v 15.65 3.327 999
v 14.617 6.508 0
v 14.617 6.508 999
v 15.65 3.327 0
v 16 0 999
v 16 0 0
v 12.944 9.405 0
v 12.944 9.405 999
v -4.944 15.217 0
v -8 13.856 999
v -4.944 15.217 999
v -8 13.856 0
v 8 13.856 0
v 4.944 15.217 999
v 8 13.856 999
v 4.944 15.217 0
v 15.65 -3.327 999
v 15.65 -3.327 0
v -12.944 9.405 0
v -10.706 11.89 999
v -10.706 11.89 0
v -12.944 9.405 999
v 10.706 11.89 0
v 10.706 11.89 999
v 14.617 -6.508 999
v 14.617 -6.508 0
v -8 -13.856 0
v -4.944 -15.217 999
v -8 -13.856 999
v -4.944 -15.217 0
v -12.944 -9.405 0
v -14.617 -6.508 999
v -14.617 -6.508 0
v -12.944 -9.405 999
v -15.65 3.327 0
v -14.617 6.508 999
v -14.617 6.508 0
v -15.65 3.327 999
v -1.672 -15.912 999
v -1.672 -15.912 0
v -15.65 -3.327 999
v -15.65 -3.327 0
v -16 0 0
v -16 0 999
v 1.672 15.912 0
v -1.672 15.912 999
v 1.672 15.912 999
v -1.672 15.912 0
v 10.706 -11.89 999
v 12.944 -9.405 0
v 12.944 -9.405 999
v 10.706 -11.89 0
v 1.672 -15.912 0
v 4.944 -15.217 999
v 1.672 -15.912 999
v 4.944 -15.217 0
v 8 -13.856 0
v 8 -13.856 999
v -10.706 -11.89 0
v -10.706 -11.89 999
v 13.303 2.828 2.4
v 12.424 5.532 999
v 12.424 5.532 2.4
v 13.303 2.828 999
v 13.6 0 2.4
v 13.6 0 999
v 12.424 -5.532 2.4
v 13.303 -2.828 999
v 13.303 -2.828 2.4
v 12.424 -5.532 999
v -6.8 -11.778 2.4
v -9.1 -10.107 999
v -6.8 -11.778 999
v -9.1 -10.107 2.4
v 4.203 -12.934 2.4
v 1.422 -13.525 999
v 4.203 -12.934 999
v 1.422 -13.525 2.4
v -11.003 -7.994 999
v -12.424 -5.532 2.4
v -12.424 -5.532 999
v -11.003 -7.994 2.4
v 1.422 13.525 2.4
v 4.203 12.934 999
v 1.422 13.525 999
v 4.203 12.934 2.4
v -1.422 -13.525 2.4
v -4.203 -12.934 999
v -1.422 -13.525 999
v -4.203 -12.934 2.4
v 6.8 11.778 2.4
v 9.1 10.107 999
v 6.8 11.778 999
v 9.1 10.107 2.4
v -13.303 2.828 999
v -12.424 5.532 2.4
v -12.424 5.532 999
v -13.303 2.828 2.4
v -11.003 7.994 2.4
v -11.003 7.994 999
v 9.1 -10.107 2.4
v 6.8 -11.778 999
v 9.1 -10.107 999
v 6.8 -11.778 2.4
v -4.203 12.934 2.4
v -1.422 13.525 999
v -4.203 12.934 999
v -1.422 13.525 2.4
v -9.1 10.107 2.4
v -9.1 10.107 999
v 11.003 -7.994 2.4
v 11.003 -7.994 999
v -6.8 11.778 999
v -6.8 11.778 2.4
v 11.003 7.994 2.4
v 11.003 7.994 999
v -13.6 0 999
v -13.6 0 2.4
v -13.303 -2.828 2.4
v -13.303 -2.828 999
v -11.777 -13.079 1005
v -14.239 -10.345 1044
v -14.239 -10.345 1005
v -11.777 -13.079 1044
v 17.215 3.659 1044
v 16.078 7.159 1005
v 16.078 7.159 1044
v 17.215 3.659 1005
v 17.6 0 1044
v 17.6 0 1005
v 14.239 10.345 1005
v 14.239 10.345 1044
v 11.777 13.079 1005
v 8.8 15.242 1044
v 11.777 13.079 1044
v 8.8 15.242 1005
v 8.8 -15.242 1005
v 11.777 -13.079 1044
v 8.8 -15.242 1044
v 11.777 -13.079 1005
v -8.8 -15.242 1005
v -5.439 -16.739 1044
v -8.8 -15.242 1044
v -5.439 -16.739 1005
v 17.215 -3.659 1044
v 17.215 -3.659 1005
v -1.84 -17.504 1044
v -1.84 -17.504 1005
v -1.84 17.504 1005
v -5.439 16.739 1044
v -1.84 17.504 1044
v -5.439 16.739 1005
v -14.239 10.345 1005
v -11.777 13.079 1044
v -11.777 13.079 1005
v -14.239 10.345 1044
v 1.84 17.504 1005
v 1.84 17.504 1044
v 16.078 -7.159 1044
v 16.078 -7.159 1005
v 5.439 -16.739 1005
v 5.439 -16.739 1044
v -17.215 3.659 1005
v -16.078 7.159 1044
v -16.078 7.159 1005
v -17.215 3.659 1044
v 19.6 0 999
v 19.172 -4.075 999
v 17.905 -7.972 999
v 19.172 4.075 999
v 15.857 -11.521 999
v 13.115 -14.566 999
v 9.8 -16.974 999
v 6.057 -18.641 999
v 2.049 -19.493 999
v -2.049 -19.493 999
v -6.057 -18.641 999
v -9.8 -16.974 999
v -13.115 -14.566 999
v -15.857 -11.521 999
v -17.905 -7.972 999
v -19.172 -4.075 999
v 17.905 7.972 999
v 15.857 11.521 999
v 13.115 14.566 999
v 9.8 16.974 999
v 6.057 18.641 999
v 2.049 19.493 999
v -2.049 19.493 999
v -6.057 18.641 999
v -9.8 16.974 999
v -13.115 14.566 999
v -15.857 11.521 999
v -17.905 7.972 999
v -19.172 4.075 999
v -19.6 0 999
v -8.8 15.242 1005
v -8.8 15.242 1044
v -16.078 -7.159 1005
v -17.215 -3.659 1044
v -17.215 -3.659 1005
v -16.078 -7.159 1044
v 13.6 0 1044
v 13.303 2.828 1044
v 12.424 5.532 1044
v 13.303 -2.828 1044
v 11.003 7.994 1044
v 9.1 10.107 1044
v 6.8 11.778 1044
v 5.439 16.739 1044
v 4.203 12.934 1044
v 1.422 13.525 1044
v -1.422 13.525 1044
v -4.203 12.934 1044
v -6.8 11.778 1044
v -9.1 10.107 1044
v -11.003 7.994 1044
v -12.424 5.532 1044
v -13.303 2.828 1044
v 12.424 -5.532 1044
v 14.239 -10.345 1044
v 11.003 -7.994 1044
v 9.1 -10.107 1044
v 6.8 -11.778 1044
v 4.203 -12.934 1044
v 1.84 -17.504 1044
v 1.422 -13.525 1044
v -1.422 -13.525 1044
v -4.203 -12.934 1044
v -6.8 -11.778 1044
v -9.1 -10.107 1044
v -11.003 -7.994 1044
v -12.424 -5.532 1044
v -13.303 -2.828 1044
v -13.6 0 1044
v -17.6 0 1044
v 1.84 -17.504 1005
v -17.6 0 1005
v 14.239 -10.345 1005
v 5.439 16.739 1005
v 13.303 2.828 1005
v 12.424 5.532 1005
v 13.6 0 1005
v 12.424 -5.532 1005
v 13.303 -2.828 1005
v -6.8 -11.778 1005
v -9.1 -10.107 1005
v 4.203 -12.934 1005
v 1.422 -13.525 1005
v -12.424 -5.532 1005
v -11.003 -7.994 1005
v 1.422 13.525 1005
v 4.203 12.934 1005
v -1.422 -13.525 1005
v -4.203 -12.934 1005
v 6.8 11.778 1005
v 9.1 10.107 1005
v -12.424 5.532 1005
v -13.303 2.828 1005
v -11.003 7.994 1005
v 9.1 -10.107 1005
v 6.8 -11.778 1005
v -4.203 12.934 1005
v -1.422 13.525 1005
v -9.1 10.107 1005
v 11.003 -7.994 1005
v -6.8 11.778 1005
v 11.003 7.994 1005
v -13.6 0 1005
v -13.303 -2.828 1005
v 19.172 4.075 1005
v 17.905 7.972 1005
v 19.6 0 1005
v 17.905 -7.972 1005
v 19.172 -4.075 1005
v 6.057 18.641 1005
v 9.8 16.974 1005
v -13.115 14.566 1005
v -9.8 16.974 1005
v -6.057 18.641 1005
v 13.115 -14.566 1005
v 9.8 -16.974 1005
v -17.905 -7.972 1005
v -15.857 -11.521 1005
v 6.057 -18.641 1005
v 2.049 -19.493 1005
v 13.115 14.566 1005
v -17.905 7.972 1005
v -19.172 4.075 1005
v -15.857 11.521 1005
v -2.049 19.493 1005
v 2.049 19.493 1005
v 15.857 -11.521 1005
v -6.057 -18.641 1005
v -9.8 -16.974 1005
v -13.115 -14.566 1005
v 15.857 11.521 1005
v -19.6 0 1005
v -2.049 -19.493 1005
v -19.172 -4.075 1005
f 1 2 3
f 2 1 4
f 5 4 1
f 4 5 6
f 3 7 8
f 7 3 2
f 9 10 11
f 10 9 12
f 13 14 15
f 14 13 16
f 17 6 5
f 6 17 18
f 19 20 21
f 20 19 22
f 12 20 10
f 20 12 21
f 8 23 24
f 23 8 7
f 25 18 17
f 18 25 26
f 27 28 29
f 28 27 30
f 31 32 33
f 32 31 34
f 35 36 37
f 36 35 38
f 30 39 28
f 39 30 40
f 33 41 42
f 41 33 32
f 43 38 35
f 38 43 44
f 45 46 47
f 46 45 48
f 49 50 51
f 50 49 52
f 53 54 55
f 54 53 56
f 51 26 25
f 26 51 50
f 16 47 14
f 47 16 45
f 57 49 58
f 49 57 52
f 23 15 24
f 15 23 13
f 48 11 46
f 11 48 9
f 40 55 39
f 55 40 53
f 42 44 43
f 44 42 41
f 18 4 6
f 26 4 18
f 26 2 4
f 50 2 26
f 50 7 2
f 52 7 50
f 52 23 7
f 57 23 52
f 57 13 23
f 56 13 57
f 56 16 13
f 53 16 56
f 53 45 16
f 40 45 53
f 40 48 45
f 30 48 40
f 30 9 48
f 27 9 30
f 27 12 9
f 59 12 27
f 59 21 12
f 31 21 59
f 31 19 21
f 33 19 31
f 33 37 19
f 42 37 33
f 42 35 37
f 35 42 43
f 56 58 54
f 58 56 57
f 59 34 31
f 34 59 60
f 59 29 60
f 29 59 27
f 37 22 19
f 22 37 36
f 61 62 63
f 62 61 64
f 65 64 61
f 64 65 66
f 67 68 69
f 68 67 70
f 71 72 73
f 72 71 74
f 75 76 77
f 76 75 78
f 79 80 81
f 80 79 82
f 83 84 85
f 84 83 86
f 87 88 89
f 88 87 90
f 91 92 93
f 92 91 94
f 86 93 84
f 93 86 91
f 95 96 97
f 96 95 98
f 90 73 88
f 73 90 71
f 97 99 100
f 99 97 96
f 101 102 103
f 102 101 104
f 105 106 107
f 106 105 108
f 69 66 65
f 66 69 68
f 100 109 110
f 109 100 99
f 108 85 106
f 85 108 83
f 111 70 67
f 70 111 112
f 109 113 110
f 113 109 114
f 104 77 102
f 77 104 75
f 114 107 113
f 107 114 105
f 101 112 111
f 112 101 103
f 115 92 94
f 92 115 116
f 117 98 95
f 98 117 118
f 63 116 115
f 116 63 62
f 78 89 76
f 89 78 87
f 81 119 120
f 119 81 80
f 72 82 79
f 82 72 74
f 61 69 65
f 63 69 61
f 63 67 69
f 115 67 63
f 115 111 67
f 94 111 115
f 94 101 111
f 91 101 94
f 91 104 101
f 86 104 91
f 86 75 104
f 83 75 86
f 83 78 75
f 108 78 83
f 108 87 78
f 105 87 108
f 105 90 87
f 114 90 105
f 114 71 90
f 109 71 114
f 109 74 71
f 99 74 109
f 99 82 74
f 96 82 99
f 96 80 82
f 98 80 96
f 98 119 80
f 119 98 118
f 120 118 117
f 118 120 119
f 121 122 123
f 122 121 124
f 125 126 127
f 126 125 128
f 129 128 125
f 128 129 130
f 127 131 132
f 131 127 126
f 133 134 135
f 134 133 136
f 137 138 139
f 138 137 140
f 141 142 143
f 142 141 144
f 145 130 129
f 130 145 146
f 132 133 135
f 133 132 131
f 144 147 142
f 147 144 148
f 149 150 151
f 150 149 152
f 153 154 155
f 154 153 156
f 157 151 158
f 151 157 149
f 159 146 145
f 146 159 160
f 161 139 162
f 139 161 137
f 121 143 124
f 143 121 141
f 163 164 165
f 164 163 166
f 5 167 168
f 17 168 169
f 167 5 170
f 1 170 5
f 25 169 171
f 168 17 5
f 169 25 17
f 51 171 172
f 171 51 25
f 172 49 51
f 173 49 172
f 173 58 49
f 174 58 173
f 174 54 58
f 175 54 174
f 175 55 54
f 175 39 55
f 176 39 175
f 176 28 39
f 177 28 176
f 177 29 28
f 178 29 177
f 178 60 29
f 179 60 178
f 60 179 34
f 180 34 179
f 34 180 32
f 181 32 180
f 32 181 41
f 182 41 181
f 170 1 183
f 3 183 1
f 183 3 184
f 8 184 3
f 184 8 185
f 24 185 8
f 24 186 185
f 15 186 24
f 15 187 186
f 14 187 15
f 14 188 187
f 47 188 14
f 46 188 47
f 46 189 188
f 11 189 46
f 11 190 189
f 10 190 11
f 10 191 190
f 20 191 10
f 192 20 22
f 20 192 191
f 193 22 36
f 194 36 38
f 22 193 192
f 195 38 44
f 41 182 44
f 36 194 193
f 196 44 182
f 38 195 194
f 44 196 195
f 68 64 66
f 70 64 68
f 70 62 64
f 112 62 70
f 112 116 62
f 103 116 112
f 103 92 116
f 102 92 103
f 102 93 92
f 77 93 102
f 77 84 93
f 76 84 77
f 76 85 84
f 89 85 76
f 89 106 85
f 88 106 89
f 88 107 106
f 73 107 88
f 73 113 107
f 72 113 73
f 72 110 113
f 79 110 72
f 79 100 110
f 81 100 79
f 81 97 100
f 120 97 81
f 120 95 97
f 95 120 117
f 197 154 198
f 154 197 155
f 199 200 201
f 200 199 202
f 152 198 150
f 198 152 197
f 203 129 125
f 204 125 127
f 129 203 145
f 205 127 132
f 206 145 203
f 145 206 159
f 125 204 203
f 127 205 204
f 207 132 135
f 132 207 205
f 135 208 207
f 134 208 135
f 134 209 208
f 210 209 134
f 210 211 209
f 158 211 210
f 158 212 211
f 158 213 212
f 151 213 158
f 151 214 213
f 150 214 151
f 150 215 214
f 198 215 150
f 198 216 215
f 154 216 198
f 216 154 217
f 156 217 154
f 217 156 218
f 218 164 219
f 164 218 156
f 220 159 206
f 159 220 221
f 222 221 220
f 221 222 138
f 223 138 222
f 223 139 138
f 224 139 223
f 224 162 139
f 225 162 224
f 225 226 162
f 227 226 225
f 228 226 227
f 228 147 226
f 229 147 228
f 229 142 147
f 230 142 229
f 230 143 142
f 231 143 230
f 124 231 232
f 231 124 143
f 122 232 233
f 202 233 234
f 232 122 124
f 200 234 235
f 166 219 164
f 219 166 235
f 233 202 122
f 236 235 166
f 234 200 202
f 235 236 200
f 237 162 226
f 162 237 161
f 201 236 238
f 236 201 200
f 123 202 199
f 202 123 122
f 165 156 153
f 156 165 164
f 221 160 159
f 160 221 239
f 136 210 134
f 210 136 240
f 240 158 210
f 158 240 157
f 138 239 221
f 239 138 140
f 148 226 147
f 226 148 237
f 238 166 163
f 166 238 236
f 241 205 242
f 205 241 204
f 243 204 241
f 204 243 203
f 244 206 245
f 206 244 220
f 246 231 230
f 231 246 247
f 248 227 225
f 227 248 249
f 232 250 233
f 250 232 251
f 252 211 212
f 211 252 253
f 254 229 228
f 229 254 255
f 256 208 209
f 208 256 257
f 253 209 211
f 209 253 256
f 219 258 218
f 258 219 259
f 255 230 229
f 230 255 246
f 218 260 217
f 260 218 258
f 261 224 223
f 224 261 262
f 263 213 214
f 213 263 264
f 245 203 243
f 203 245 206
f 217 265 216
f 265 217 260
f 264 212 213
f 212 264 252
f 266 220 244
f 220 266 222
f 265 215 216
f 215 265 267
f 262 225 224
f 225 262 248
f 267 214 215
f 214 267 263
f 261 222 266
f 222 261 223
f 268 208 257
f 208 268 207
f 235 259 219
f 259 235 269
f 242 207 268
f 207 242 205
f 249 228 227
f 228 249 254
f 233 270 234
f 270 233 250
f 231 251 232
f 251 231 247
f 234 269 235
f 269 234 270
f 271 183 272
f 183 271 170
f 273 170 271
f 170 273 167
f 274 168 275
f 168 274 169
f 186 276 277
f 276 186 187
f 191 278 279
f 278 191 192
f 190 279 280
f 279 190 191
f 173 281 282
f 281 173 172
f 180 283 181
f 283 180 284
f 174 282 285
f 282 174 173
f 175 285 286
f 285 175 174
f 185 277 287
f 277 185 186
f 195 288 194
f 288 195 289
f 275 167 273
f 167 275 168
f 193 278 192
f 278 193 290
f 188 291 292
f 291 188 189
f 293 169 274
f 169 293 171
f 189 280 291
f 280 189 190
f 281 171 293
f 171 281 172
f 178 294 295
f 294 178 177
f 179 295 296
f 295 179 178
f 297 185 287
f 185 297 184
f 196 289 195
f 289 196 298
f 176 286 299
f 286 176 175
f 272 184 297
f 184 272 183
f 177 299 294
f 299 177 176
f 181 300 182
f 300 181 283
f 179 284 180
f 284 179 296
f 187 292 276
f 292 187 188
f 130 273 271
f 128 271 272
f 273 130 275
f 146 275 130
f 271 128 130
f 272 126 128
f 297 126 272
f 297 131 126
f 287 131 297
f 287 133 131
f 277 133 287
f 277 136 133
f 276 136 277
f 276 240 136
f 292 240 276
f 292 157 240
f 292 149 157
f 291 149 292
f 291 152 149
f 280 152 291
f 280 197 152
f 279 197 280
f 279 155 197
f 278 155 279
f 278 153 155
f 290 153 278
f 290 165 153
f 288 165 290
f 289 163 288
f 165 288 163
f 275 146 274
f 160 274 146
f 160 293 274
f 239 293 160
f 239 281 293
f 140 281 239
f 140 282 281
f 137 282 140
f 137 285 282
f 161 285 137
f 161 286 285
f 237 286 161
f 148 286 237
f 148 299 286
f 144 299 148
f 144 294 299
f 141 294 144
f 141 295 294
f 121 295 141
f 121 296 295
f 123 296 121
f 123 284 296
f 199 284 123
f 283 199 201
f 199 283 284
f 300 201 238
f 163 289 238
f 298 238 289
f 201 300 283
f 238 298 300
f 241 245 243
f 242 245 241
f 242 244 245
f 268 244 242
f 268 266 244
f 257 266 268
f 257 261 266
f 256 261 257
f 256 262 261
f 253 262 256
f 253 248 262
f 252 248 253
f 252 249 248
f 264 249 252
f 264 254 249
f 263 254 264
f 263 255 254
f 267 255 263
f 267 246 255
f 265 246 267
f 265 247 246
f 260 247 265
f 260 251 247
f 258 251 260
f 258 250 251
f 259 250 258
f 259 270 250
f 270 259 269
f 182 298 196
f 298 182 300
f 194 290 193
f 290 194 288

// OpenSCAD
// Parameters
pipe_standard = 1; //[1:1:1]
nominal_size_mm = 32; //[16:64:1]
length_mm = 1000; //[500:2000:10]
pipe_od_mm = 32; //[20:64:1]
pipe_wall_mm = 2.4; //[1.2:4.8:0.1]
fit_socket_len_mm = 45; //[25:90:1]
fit_socket_wall_extra_mm = 1.6; //[0.8:3.2:0.1]
fit_stop_ring_len_mm = 6; //[3:12:1]
fit_stop_ring_radial_mm = 2; //[1:4:0.5]
overlap_mm = 1; //[0.5:2:0.1]

// HT Pipe - complete geometry
module ht_pipe() {
  color([0.85, 0.85, 0.8]) {
    // Pipe body
    difference() {
      cylinder(h=length_mm, r=pipe_od_mm/2, center=false);
      translate([0, 0, pipe_wall_mm])
        cylinder(h=length_mm, r=pipe_od_mm/2 - pipe_wall_mm, center=false);
    }
    
    // End fitting socket
    difference() {
      translate([0, 0, length_mm - overlap_mm])
        cylinder(h=fit_socket_len_mm, r=pipe_od_mm/2 + fit_socket_wall_extra_mm, center=false);
      translate([0, 0, length_mm - overlap_mm + pipe_wall_mm])
        cylinder(h=fit_socket_len_mm, r=pipe_od_mm/2 - pipe_wall_mm, center=false);
    }
    
    // End fitting stop ring
    translate([0, 0, length_mm - overlap_mm])
      cylinder(h=fit_stop_ring_len_mm, r=pipe_od_mm/2 + fit_socket_wall_extra_mm + fit_stop_ring_radial_mm, center=false);
  }
}

// Assembly
module assembly() {
  ht_pipe();
}

assembly();
